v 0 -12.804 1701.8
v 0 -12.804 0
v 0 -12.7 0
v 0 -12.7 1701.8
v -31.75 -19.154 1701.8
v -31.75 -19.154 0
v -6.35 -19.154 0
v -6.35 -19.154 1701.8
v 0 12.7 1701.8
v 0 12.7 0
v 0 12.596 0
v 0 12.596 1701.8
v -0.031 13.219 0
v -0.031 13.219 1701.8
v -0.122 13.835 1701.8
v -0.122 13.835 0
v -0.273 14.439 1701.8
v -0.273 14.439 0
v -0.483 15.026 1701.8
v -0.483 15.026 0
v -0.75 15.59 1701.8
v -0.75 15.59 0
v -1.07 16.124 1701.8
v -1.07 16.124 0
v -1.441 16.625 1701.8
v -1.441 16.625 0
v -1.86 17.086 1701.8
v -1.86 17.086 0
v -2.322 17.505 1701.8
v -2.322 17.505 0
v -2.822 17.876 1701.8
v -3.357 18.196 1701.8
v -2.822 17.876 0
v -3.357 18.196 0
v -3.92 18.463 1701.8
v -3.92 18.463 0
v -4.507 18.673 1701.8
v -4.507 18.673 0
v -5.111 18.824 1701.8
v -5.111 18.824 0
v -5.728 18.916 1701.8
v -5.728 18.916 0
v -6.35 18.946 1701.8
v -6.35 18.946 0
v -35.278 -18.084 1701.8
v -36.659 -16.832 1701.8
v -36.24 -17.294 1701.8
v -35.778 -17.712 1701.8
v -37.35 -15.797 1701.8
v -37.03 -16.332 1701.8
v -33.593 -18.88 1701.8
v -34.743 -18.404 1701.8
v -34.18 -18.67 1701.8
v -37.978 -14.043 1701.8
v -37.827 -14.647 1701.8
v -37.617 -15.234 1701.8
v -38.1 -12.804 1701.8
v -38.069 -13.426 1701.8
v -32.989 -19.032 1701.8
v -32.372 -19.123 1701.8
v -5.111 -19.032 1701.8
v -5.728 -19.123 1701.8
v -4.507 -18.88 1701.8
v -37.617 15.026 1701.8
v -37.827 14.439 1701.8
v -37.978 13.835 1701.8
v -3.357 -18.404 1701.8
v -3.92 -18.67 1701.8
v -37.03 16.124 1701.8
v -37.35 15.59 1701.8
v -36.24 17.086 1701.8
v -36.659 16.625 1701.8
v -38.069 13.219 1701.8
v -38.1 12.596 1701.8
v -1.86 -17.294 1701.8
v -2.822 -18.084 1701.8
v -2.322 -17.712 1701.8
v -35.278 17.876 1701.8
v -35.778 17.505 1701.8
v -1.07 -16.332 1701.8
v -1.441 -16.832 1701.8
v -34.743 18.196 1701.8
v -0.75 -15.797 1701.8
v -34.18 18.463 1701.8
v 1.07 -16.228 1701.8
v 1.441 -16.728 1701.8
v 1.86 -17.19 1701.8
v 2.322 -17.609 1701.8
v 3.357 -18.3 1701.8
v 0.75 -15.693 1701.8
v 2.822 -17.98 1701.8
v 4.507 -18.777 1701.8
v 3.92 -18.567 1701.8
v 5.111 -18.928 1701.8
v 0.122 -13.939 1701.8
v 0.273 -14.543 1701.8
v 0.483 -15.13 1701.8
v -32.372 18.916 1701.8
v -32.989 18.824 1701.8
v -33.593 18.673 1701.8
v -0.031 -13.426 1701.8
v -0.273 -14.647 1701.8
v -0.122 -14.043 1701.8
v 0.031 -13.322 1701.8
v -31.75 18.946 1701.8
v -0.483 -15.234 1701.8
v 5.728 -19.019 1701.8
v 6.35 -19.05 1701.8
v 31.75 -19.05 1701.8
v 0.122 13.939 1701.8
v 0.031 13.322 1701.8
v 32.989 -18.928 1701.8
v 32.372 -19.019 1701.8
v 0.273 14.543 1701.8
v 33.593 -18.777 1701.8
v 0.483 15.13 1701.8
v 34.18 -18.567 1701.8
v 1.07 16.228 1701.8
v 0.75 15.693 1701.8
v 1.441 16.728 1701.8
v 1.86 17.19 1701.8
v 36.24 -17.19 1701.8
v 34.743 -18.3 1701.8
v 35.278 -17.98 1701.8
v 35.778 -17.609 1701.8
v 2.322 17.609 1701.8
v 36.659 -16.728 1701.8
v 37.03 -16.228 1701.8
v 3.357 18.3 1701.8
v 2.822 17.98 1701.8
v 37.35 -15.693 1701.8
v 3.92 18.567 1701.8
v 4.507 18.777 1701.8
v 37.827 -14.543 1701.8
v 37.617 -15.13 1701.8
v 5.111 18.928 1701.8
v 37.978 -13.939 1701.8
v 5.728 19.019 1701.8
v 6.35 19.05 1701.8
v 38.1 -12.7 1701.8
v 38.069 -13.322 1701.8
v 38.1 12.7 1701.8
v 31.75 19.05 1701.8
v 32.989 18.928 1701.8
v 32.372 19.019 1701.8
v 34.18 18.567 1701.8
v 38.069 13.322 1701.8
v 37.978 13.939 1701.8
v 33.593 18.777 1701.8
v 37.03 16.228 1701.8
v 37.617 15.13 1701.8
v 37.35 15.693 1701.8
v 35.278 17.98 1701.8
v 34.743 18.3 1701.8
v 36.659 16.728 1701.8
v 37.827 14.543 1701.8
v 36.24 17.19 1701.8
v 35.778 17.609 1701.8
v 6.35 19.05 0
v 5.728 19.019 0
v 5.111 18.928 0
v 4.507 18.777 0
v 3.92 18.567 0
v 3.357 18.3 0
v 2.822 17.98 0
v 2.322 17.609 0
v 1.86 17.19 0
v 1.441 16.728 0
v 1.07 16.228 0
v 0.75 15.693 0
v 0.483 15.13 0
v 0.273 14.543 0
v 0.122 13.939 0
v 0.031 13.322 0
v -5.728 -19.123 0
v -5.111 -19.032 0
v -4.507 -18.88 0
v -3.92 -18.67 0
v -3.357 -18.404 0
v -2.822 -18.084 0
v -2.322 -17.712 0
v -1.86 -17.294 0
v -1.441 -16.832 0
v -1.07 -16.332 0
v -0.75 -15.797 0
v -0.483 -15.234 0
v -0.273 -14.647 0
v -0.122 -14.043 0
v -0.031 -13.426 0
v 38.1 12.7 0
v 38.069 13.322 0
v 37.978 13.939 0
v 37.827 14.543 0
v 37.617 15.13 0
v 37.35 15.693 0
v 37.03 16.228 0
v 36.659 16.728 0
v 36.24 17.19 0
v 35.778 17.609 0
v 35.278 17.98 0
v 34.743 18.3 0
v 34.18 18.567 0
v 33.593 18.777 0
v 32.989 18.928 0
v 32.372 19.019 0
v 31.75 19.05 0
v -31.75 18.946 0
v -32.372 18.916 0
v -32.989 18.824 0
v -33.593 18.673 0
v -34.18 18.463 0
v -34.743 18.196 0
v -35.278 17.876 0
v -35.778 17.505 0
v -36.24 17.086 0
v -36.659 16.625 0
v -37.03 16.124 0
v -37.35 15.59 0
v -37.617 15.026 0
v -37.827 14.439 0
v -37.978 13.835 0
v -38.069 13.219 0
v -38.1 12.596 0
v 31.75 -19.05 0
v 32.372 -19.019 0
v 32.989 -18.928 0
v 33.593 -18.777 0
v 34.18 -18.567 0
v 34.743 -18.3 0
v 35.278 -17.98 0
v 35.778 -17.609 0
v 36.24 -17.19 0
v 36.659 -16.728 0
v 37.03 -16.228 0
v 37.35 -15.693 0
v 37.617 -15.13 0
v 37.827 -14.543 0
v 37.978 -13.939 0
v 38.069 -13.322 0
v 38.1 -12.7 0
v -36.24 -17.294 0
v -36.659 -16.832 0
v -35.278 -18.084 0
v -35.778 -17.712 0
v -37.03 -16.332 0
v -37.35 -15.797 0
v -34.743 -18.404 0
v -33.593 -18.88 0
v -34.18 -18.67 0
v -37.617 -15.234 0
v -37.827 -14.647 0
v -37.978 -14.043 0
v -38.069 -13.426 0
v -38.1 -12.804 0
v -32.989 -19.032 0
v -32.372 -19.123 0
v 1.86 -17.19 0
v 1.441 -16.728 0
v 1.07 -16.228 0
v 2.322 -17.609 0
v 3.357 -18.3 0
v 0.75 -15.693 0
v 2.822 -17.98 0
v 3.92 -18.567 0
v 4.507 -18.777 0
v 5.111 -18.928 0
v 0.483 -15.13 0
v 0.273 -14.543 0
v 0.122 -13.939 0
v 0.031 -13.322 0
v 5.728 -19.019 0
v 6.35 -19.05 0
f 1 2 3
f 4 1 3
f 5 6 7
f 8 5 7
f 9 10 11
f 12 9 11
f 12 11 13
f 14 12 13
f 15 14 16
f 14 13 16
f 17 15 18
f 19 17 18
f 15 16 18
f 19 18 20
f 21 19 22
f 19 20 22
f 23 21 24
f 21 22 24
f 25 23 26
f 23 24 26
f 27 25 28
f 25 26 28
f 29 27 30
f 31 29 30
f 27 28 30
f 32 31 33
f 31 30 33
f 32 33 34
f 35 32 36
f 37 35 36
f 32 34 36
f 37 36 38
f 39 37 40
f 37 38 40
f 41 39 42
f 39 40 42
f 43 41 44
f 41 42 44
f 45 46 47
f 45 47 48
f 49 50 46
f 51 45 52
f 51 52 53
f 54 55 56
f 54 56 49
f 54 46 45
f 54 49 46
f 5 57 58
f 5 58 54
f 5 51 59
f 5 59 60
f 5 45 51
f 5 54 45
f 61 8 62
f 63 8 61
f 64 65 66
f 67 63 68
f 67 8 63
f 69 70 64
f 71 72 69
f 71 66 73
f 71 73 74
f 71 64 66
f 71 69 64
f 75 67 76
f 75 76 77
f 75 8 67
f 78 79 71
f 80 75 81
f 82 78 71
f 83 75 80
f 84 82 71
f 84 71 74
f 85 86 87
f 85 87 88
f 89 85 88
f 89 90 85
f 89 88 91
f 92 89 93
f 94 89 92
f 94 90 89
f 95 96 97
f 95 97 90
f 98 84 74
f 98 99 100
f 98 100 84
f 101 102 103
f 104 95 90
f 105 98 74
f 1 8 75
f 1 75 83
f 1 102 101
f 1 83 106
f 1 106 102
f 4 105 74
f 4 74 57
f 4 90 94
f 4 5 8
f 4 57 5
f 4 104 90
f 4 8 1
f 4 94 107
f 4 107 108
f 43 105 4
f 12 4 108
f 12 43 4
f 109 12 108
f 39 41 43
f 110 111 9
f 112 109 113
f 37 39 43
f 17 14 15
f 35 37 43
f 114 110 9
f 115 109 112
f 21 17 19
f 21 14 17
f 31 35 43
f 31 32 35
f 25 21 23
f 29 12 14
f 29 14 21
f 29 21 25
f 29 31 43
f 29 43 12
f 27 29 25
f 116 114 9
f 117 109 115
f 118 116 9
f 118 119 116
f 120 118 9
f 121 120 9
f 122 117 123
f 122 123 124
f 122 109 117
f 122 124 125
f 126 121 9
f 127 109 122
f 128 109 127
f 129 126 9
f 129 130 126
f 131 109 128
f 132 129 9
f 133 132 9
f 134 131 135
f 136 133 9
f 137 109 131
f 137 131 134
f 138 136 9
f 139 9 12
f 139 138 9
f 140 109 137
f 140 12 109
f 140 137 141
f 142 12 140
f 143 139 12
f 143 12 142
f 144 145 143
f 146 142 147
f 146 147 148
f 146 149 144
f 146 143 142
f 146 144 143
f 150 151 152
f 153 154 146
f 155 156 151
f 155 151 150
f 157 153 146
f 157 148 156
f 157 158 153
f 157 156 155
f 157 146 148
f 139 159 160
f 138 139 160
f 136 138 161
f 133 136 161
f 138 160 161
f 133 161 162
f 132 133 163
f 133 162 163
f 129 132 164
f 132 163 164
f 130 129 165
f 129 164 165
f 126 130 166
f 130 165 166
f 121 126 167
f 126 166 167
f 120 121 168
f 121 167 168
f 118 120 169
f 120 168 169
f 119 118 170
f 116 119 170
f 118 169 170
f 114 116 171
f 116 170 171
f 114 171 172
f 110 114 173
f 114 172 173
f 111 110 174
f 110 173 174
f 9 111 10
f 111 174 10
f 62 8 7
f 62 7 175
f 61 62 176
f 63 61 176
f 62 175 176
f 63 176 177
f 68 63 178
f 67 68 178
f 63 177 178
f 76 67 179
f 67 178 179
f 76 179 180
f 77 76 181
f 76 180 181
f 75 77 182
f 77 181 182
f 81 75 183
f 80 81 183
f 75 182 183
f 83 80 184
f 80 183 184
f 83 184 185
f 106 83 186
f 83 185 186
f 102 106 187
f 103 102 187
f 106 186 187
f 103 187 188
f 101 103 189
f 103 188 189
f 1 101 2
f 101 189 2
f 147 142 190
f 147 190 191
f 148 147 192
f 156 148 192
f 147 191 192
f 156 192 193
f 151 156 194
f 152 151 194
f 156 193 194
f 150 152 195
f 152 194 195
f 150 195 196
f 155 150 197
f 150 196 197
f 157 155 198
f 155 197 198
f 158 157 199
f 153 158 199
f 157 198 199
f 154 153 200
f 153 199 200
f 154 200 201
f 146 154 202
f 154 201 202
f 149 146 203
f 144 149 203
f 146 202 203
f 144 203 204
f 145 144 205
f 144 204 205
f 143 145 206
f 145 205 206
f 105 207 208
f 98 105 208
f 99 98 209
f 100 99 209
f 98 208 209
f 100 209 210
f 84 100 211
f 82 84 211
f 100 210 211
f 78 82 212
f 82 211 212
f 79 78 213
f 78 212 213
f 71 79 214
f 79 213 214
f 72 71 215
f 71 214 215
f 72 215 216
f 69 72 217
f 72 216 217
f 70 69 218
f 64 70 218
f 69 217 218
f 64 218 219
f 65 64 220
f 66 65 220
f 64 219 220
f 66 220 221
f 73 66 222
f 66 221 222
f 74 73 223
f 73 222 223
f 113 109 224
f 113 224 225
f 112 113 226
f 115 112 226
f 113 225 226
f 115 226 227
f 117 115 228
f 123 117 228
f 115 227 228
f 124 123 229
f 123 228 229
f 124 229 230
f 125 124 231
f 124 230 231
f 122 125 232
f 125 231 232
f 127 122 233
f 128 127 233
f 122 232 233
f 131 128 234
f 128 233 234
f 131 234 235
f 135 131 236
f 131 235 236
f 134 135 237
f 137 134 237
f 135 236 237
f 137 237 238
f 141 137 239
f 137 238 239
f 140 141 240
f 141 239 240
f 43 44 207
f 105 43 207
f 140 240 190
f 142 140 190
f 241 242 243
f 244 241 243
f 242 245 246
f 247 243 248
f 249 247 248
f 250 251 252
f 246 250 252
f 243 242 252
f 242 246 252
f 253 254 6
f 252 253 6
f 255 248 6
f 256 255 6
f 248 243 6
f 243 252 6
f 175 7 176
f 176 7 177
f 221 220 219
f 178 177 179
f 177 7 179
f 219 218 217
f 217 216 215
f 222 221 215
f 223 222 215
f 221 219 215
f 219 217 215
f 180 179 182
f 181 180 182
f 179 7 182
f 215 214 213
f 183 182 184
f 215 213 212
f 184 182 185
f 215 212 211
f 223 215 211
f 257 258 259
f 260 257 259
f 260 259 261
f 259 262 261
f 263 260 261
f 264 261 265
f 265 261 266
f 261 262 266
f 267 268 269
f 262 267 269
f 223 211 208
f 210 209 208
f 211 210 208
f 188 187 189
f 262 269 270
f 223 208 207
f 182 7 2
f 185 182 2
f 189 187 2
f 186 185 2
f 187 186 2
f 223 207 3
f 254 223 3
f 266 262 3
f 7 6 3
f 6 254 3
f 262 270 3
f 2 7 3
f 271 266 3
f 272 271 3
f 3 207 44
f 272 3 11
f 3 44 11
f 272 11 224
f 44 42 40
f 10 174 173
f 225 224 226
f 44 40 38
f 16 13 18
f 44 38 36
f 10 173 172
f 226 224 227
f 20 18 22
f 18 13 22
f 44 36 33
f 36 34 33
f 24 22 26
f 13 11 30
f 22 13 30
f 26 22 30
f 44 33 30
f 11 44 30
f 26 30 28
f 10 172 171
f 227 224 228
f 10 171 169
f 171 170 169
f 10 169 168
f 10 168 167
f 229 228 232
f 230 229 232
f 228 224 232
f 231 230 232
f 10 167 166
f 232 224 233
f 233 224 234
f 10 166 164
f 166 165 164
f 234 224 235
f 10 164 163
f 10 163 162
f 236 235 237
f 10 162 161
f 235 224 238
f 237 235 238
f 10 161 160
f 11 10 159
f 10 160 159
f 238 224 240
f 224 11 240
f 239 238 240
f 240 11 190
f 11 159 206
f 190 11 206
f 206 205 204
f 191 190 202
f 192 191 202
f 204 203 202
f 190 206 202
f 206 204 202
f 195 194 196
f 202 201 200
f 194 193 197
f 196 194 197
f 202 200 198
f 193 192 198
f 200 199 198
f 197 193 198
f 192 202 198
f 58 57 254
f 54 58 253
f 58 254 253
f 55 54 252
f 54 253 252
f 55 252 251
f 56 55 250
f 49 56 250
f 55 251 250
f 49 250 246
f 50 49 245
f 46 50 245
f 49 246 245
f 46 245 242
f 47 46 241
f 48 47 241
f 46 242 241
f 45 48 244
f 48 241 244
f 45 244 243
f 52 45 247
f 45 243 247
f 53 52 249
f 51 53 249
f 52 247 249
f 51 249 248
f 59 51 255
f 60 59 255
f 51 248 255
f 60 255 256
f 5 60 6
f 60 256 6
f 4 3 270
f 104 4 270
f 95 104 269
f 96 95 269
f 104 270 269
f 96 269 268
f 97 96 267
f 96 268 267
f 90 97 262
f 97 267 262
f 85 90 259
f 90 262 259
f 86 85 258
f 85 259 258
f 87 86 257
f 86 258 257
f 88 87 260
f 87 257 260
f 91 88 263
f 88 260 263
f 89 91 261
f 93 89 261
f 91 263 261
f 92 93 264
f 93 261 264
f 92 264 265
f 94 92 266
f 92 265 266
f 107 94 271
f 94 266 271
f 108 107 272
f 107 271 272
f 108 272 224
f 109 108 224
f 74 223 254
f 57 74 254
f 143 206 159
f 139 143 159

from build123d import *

# Parameters (mm, degrees)
F1_DEPTH = 1701.8


with BuildPart() as f1:
    # F0 (on Top) → F1 (new body)
    with BuildSketch(Plane.XY):
        with BuildLine():
            ThreePointArc((0, 12.596164), (-1.859872, 17.086292), (-6.35, 18.946164))
            Line((-6.35, 18.946164), (-31.75, 18.946164))
            ThreePointArc((-31.75, 18.946164), (-36.240128, 17.086292), (-38.1, 12.596164))
            Line((-38.1, 12.596164), (-38.1, -12.803836))
            ThreePointArc((-38.1, -12.803836), (-36.240128, -17.293964), (-31.75, -19.153836))
            Line((-31.75, -19.153836), (-6.35, -19.153836))
            ThreePointArc((-6.35, -19.153836), (-1.859872, -17.293964), (0, -12.803836))
            Line((0, -12.803836), (0, -12.7))
            Line((0, -12.7), (0, 12.596164))
        make_face()
        with BuildLine():
            Line((0, 12.7), (0, 12.596164))
            Line((0, 12.596164), (0, -12.7))
            ThreePointArc((0, -12.7), (1.859872, -17.190128), (6.35, -19.05))
            Line((6.35, -19.05), (31.75, -19.05))
            ThreePointArc((31.75, -19.05), (36.240128, -17.190128), (38.1, -12.7))
            Line((38.1, -12.7), (38.1, 12.7))
            ThreePointArc((38.1, 12.7), (36.240128, 17.190128), (31.75, 19.05))
            Line((31.75, 19.05), (6.35, 19.05))
            ThreePointArc((6.35, 19.05), (1.859872, 17.190128), (0, 12.7))
        make_face()
    extrude(amount=F1_DEPTH)


solid = f1.part
